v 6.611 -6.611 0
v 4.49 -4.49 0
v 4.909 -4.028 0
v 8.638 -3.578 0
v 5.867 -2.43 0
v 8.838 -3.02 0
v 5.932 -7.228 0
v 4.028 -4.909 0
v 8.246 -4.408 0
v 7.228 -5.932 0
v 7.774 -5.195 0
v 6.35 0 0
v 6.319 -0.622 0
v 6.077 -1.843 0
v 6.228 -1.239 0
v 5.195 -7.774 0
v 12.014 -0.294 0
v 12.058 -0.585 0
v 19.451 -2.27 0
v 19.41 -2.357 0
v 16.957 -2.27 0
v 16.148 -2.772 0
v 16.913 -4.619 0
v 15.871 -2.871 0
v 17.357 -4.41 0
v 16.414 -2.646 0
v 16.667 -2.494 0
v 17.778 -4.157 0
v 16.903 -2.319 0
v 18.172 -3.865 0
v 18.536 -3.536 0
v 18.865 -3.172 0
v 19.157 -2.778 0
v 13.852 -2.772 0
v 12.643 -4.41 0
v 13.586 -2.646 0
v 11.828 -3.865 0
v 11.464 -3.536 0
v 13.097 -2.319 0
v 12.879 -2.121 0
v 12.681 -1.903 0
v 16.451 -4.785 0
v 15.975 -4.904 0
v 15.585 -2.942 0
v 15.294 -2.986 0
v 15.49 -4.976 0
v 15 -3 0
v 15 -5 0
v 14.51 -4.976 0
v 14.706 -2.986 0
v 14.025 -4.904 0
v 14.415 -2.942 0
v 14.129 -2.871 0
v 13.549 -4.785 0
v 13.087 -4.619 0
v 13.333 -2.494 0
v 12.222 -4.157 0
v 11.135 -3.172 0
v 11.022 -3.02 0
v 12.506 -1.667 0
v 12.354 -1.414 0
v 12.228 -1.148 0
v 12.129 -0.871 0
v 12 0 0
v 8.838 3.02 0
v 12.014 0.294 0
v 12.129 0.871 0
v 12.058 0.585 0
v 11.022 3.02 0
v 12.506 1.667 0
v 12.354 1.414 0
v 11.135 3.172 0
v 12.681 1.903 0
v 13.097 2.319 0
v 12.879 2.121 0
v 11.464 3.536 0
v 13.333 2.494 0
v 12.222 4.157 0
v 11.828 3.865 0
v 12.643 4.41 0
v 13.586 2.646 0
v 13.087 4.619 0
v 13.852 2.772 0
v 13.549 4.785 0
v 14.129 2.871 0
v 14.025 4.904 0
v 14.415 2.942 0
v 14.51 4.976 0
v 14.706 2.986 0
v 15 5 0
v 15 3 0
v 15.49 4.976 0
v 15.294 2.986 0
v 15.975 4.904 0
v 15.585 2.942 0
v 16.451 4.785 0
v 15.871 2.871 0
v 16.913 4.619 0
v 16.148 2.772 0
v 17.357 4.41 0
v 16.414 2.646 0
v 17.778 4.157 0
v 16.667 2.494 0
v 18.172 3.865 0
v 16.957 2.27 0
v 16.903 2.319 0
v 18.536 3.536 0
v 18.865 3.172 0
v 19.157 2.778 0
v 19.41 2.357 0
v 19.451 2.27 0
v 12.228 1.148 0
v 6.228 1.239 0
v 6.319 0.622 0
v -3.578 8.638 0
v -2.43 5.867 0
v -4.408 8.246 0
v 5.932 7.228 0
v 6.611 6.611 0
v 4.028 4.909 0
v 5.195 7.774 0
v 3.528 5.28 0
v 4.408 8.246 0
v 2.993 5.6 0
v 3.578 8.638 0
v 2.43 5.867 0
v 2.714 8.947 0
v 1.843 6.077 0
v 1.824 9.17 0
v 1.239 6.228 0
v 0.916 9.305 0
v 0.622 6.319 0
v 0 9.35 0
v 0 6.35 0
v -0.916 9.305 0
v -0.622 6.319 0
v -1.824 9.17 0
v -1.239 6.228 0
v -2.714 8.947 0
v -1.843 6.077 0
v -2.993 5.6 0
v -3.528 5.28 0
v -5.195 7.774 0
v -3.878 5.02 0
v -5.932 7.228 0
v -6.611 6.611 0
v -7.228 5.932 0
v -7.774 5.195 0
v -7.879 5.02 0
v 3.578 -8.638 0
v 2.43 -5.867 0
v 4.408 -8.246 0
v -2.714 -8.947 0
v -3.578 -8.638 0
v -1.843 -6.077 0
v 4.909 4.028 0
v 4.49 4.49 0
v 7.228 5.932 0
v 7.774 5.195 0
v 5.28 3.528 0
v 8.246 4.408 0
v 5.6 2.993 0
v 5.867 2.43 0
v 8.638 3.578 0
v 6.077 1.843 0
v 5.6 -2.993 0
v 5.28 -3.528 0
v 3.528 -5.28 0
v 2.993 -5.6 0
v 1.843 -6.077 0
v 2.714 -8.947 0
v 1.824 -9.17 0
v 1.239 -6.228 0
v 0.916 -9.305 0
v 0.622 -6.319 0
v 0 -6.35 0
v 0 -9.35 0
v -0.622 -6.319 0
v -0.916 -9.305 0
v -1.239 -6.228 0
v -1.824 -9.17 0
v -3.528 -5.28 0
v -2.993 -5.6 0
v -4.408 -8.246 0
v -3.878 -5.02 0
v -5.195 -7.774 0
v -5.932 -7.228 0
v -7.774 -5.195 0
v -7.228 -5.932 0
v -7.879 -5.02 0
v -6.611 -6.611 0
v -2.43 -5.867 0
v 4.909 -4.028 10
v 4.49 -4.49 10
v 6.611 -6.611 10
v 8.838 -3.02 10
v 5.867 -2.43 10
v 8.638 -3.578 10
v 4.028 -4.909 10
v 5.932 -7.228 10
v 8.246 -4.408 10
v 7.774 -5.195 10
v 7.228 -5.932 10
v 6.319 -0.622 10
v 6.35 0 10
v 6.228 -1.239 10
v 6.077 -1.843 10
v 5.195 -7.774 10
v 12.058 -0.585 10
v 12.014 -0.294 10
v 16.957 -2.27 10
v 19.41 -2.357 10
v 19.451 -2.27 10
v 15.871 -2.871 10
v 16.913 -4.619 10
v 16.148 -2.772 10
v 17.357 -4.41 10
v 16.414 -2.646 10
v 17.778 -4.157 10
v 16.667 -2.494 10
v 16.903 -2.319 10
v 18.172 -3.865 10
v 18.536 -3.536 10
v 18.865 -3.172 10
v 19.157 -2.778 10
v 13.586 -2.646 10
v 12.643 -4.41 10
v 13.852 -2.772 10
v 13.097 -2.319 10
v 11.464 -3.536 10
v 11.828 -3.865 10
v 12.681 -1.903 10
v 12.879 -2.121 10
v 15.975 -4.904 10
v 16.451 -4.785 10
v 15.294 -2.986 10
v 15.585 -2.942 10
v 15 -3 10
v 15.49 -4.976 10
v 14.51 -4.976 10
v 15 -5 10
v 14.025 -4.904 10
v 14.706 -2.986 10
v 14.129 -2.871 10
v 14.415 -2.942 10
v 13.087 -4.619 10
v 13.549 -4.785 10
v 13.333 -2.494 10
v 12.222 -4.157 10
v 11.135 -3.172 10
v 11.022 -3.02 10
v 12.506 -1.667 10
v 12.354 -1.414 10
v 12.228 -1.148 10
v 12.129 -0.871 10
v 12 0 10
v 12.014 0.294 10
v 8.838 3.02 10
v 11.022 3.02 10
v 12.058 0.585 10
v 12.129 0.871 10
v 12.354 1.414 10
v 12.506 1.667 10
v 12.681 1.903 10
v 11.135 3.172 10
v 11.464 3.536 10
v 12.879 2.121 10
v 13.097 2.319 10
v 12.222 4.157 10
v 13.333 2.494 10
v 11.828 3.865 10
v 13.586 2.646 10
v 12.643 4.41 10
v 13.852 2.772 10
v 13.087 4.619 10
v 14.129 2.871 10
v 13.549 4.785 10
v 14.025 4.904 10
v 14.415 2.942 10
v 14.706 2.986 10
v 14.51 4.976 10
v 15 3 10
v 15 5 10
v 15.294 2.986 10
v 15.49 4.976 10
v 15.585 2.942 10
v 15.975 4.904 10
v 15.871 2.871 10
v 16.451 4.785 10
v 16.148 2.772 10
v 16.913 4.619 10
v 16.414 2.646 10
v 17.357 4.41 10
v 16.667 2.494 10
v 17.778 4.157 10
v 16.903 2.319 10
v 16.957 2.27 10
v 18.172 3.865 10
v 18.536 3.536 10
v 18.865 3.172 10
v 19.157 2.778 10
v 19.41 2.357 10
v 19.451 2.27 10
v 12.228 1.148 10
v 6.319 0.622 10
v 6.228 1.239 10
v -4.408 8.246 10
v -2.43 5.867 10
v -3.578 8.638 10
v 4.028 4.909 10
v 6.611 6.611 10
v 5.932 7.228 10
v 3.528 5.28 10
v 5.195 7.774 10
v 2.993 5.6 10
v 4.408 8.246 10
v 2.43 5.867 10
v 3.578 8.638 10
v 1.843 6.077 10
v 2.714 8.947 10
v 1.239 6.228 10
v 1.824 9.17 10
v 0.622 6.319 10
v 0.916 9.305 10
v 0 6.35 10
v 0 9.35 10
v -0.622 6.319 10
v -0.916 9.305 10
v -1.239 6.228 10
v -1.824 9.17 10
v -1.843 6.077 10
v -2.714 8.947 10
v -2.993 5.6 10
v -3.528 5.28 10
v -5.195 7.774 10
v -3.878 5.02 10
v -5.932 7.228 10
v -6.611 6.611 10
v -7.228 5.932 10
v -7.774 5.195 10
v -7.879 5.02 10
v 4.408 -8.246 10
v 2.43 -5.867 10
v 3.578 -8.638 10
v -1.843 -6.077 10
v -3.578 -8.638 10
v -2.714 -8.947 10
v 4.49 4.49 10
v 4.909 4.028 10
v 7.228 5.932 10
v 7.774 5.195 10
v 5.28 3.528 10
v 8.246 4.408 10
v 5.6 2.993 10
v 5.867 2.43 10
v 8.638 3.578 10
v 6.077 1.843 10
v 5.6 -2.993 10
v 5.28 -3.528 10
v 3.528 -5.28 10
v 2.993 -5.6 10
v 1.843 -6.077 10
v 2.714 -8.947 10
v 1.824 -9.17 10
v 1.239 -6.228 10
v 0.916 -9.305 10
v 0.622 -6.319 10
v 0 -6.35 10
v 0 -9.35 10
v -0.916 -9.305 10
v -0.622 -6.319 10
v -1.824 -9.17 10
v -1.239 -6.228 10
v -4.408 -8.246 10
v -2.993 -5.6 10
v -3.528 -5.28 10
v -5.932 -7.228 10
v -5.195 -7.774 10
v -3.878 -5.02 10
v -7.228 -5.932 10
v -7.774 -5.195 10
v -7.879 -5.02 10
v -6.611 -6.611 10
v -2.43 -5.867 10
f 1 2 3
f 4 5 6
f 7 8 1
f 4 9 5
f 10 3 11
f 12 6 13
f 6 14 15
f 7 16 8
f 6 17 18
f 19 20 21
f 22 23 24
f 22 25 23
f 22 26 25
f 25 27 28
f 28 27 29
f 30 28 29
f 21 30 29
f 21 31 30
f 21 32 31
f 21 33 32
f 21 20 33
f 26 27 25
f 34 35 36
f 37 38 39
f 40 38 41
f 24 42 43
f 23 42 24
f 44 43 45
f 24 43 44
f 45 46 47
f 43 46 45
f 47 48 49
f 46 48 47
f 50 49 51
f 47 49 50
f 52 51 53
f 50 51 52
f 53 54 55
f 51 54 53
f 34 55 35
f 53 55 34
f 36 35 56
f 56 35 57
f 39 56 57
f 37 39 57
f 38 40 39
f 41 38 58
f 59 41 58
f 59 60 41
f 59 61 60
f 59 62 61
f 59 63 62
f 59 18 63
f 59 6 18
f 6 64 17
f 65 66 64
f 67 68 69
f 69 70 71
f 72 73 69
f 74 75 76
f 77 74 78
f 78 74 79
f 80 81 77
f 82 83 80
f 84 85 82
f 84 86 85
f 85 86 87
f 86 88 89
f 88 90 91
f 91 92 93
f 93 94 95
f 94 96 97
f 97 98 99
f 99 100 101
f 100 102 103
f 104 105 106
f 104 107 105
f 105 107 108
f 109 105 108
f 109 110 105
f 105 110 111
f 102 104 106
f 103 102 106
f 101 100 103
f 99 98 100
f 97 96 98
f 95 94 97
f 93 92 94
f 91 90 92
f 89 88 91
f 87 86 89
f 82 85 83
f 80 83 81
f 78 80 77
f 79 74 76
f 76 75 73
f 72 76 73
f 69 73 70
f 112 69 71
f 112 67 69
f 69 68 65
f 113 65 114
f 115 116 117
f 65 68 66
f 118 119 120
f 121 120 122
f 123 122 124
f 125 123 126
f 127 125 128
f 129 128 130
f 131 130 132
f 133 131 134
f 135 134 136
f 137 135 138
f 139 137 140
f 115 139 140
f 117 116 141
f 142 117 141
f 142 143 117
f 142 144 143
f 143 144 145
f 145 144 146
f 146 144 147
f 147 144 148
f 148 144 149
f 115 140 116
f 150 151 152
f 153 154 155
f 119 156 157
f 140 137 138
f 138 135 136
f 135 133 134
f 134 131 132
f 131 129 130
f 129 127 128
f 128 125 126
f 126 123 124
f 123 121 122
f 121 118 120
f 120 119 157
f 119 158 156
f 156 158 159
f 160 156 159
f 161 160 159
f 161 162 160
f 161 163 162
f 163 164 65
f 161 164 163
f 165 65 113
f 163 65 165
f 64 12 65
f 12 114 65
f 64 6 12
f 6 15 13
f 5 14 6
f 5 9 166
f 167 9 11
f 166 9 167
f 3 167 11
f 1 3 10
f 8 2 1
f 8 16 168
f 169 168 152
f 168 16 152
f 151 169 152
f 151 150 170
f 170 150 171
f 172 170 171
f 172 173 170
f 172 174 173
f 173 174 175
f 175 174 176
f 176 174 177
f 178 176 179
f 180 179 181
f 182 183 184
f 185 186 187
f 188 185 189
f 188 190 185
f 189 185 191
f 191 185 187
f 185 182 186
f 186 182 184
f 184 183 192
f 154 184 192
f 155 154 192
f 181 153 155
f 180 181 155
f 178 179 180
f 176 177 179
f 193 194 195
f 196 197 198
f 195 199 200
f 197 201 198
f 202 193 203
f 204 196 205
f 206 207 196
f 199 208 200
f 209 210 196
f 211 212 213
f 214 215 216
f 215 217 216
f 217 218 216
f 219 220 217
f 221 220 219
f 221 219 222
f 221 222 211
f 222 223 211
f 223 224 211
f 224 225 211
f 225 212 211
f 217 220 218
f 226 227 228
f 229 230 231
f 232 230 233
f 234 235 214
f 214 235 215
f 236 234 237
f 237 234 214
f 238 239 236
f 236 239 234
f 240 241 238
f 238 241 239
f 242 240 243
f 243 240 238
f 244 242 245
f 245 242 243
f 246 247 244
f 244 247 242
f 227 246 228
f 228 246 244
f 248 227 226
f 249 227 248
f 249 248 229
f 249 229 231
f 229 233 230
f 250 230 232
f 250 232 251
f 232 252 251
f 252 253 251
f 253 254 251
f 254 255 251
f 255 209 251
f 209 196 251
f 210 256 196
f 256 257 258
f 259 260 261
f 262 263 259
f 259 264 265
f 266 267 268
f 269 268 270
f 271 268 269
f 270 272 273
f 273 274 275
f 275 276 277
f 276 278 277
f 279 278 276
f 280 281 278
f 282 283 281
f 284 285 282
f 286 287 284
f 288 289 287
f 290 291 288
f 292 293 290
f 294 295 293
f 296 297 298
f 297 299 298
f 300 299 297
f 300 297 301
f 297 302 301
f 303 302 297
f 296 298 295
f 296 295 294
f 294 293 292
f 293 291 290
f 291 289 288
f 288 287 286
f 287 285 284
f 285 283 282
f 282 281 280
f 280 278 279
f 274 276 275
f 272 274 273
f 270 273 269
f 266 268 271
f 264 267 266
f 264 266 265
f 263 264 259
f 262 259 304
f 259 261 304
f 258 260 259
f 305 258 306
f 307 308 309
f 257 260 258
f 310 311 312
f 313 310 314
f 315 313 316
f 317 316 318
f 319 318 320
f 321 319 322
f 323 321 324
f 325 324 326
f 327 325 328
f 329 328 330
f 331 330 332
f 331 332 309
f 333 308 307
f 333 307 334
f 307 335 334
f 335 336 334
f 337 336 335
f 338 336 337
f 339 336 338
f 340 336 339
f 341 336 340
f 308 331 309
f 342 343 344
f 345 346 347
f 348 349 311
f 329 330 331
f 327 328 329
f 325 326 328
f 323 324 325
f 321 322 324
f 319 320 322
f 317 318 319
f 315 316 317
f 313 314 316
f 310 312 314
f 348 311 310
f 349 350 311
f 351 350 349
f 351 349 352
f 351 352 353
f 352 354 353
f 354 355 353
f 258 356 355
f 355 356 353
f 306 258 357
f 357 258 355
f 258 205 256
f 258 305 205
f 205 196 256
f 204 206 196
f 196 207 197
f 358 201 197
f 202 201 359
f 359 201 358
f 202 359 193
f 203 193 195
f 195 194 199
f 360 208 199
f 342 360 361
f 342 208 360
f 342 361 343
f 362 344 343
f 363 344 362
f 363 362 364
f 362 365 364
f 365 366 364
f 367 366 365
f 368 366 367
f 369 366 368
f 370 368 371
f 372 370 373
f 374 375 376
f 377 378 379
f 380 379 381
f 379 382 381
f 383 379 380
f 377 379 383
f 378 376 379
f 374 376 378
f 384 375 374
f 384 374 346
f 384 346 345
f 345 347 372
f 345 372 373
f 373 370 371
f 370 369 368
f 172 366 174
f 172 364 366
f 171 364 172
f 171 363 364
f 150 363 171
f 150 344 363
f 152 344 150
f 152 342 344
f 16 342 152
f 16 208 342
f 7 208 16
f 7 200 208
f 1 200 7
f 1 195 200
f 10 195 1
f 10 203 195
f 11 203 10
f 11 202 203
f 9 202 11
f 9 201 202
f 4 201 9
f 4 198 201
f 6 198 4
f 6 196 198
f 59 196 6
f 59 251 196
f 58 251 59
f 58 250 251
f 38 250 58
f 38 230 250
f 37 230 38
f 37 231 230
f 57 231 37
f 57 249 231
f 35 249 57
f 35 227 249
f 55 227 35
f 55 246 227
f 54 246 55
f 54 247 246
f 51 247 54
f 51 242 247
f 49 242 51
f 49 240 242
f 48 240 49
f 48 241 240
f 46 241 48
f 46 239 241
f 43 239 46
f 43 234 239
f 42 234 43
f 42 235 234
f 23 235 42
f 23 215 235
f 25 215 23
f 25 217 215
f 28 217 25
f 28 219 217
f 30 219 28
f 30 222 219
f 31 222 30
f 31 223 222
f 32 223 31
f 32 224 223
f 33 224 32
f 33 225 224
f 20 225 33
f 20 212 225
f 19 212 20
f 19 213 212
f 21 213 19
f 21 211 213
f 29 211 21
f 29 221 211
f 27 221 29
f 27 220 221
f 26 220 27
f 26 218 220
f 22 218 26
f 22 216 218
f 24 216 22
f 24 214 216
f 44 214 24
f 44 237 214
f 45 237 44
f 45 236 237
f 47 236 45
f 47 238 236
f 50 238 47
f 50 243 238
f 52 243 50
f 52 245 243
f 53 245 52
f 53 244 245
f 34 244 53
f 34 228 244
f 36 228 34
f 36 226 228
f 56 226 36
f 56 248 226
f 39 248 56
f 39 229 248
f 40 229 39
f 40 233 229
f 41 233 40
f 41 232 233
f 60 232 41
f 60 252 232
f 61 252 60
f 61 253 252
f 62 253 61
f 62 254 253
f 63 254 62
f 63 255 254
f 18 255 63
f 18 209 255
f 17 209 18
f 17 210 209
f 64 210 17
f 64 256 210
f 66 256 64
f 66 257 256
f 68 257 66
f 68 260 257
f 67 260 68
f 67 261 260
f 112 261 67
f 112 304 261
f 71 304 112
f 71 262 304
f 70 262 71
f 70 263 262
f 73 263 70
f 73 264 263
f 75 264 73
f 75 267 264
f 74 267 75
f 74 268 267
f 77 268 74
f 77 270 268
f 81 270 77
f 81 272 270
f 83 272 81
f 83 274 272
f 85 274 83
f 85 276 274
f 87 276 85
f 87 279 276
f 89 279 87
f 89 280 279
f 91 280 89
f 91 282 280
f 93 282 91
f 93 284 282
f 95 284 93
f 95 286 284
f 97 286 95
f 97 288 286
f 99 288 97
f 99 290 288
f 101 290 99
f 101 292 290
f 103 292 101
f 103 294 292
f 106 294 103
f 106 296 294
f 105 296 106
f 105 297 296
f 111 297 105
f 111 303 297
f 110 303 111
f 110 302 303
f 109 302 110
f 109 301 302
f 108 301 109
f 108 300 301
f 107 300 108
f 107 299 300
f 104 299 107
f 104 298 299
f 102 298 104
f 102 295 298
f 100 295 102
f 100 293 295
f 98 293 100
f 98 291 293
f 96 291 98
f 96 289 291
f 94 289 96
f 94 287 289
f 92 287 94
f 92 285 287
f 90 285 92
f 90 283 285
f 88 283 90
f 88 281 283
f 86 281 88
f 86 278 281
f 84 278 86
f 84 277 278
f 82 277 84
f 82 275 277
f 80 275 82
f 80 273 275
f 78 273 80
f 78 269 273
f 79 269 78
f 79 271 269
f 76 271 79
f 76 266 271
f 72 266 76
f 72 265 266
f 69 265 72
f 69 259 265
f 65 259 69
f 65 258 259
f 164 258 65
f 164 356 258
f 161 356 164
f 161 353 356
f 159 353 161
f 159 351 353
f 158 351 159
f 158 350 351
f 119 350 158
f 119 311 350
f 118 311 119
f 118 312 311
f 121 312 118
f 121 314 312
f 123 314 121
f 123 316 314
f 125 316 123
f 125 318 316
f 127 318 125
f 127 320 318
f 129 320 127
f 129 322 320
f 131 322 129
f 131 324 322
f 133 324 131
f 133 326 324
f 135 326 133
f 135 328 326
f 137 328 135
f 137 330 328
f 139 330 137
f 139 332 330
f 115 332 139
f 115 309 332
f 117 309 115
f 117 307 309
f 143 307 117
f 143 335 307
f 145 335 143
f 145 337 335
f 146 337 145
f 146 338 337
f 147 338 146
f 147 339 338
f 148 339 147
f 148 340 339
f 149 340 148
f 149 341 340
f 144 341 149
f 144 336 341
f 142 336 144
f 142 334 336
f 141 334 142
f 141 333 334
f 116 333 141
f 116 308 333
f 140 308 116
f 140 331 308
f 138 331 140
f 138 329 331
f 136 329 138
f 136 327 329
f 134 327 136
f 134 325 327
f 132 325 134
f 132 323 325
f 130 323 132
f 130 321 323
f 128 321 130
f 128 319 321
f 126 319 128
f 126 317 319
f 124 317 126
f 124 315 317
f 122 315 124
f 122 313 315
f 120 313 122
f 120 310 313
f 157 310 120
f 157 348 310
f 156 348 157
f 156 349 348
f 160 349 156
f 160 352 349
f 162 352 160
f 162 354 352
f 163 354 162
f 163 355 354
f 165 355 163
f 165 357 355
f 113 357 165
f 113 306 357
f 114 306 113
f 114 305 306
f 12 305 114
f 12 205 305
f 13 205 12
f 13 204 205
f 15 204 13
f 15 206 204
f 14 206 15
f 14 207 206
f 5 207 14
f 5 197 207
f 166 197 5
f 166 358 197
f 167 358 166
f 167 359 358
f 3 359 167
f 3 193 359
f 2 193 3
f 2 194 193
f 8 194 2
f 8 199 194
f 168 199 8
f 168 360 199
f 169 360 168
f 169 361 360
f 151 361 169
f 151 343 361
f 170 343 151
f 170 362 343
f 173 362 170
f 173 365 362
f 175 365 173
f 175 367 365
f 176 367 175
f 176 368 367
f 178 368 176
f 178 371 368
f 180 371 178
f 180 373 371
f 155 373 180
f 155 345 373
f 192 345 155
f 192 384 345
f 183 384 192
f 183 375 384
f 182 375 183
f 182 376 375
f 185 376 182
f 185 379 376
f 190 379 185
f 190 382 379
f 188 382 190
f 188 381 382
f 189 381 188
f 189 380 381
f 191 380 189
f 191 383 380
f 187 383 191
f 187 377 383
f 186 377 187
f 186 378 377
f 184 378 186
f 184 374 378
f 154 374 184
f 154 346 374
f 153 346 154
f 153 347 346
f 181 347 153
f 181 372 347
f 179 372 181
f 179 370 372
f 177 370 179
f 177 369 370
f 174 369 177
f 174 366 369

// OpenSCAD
//---------------------------
//  Parameters (mm)
//---------------------------
rod_inner_d   = 12.7;   // inner diameter of the stand rod
rod_wall      = 3;      // wall thickness of the rod ring
rod_outer_d   = rod_inner_d + 2*rod_wall; // outer diameter of the rod ring

tube_inner_d  = 6;      // inner diameter of the tubing
tube_wall     = 2;      // wall thickness of the tubing ring
tube_outer_d  = tube_inner_d + 2*tube_wall; // outer diameter of the tubing ring

rod_center    = [0,0];          // centre of the rod ring
tube_center   = [15,0];         // centre of the tubing ring

bridge_x_start = 8;            // left x‑edge of the bridge
bridge_x_end   = 12;           // right x‑edge of the bridge
bridge_width_y = 6;            // total Y width of the bridge (full height)

height        = 10;            // extrusion height (Z direction)

// small over‑extension for cut shapes (to avoid coplanar faces)
over_cut = 0.02;

// set resolution for circles
$fn = 64;

//---------------------------
//  2‑D geometry
//---------------------------

// Rod ring with opening on its -X side
module rod_with_opening() {
    difference() {
        // full ring
        translate(rod_center)
            difference() {
                circle(d = rod_outer_d);
                circle(d = rod_inner_d);
            }
        // opening rectangle (x < 0, -5 < y < 5)
        translate([-1000, -5 - over_cut])
            square([1000 + over_cut, 10 + 2*over_cut]);
    }
}

// Tubing ring with opening on its +X side
module tube_with_opening() {
    difference() {
        // full ring
        translate(tube_center)
            difference() {
                circle(d = tube_outer_d);
                circle(d = tube_inner_d);
            }
        // opening rectangle (x > 15, -2.25 < y < 2.25)
        translate([tube_center[0], -2.25 - over_cut])
            square([1000 + over_cut, 4.5 + 2*over_cut]);
    }
}

// Solid bridge joining the two rings
module bridge() {
    translate([bridge_x_start, -bridge_width_y/2 - over_cut])
        square([bridge_x_end - bridge_x_start, bridge_width_y + 2*over_cut]);
}

//---------------------------
//  Assemble 2‑D profile
//---------------------------
module profile_2d() {
    union() {
        rod_with_opening();
        tube_with_opening();
        bridge();
    }
}

//---------------------------
//  Extrude to 3‑D part
//---------------------------
linear_extrude(height = height)
    profile_2d();
